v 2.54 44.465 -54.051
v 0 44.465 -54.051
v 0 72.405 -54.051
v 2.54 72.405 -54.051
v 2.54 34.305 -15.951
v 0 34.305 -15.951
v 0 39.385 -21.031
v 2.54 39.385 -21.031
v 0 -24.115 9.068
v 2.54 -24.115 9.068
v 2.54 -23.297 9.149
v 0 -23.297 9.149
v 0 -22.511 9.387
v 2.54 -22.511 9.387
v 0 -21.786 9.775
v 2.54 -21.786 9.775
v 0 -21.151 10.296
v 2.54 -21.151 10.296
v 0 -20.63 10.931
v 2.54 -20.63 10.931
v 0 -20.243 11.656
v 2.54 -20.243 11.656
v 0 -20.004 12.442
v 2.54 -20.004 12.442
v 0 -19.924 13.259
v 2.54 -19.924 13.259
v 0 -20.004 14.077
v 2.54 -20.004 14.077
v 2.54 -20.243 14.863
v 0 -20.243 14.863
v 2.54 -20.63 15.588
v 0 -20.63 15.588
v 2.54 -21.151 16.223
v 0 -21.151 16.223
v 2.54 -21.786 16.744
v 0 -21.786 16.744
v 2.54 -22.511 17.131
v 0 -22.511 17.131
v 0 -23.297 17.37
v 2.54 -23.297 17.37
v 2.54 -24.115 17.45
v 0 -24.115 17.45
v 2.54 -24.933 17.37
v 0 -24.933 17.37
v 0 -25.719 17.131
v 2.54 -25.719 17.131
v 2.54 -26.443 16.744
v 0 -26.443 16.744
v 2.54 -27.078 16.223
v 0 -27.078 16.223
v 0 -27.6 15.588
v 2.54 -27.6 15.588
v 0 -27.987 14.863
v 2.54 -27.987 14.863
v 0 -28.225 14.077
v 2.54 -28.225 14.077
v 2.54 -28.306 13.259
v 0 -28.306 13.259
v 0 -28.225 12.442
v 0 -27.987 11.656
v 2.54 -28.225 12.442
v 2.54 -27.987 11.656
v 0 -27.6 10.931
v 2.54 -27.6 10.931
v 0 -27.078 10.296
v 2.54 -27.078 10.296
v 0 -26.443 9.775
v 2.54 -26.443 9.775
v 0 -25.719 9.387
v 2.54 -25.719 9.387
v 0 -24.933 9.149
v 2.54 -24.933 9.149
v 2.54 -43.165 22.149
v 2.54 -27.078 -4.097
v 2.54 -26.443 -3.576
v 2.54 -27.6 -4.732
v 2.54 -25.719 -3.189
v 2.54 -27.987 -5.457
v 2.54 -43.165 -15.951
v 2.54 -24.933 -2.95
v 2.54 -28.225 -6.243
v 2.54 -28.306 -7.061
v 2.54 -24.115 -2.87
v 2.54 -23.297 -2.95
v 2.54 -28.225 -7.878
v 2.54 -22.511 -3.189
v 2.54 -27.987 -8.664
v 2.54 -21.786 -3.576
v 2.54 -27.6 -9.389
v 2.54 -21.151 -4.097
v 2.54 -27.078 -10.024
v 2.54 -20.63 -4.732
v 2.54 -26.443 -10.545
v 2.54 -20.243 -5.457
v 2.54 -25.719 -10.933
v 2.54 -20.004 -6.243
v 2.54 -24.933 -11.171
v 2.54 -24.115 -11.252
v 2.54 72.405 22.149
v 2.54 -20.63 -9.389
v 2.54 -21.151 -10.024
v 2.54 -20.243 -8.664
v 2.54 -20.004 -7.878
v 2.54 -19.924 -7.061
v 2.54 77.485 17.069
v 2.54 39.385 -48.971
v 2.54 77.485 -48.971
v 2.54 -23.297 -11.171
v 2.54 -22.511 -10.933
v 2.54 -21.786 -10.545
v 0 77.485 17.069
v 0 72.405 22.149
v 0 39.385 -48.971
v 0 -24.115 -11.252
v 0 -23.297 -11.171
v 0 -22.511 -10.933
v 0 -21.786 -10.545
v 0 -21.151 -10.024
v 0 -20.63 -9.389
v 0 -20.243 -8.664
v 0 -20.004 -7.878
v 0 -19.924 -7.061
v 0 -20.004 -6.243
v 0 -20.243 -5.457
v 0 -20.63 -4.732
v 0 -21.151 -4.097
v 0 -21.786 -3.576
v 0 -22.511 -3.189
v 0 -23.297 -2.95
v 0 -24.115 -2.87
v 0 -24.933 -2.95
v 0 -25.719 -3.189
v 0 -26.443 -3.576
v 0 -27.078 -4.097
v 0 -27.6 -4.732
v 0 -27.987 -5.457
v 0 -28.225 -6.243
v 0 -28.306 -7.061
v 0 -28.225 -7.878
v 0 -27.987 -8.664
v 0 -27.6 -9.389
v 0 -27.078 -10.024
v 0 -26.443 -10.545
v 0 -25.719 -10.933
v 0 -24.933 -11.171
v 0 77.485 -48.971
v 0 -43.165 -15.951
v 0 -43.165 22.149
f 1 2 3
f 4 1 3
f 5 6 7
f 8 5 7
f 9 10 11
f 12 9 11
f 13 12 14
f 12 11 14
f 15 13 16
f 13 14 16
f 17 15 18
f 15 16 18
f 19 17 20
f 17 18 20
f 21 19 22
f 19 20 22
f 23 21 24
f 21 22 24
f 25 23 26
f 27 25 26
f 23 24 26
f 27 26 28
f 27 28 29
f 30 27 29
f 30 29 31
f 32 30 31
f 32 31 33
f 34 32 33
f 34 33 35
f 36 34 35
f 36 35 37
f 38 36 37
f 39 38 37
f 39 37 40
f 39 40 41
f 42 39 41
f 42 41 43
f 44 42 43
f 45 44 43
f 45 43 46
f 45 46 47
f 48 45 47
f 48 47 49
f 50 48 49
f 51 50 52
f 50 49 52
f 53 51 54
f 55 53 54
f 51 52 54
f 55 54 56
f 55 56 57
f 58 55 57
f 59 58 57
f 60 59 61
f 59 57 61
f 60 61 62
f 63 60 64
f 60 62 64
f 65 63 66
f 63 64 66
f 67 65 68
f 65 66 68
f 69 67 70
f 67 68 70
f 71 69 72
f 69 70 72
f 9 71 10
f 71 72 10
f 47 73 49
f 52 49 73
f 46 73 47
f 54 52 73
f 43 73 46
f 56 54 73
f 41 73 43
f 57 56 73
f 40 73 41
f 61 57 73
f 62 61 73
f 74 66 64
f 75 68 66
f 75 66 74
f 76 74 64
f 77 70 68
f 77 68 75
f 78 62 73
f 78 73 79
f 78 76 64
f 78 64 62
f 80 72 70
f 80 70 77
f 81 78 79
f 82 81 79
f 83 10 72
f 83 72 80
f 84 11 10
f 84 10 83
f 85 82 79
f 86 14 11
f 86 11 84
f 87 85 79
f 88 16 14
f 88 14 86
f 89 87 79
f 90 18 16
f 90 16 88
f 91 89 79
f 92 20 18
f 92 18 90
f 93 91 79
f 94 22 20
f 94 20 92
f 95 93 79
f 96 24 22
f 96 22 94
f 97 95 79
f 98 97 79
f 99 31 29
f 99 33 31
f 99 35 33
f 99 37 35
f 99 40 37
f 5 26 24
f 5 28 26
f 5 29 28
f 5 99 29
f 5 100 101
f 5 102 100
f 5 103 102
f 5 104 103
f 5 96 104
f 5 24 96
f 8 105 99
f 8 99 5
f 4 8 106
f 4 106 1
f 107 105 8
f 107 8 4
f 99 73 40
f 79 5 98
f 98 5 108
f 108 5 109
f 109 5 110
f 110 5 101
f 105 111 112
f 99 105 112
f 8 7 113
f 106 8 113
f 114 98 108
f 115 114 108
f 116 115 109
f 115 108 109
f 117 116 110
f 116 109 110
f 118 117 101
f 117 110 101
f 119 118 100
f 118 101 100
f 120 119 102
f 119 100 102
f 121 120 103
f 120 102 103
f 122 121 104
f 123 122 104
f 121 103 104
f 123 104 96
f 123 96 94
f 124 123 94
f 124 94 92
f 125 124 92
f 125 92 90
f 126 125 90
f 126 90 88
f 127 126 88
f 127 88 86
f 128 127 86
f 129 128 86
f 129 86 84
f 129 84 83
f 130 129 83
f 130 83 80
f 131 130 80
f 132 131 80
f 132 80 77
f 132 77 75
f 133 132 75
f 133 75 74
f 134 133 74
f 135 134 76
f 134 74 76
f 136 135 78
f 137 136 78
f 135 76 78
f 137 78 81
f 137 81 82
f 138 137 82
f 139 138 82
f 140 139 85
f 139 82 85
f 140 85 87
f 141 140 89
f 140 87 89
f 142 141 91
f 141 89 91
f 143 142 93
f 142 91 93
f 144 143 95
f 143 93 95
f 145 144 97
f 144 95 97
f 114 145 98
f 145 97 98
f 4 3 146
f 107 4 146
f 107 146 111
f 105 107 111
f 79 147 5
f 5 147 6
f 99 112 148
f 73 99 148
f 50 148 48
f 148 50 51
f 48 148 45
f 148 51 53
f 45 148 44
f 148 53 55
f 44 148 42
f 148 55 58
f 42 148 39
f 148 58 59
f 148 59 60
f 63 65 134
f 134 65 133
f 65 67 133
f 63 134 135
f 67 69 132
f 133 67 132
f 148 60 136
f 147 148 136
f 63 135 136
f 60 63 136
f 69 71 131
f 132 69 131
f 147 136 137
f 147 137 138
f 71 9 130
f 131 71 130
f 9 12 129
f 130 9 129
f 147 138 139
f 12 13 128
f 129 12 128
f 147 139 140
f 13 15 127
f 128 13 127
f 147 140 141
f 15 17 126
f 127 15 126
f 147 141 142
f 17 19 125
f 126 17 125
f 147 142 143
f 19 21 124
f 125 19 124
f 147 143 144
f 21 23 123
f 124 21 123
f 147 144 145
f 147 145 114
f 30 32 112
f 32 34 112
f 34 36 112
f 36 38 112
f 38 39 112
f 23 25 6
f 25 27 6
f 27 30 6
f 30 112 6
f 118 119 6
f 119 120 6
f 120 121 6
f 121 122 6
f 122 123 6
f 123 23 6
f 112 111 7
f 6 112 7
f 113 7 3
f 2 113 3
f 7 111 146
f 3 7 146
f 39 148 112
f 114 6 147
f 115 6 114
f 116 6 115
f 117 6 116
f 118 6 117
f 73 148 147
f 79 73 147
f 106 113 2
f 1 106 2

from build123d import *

# Parameters (mm, degrees)
BOSS_EXTRUDE1_DEPTH = 2.54
SKETCH2_R           = 4.191
CUT_EXTRUDE1_DEPTH  = 95.508529347


with BuildPart() as part:
    # Sketch1 → Boss-Extrude1 (new body)
    with BuildSketch(Plane(origin=(0, 0, 0), x_dir=(0, 0, -1), z_dir=(1, 0, 0))):
        Polygon((21.030595238, 39.385119048), (48.970595238, 39.385119048), (54.050595238, 44.465119048), (54.050595238, 72.405119048), (48.970595238, 77.485119048), (-17.069404762, 77.485119048), (-22.149404762, 72.405119048), (-22.149404762, -43.164880952), (15.950595238, -43.164880952), (15.950595238, 34.305119048), align=None)
    extrude(amount=BOSS_EXTRUDE1_DEPTH)

    # Sketch2 → Cut-Extrude1 (cut, through all)
    with BuildSketch(Plane(origin=(2.54, 0, 0), x_dir=(0, 0, -1), z_dir=(1, 0, 0))):
        with Locations((-13.259404762, -24.114880952)):
            Circle(SKETCH2_R)
        with Locations((7.060595238, -24.114880952)):
            Circle(SKETCH2_R)
    extrude(amount=-CUT_EXTRUDE1_DEPTH, mode=Mode.SUBTRACT)


solid = part.part
